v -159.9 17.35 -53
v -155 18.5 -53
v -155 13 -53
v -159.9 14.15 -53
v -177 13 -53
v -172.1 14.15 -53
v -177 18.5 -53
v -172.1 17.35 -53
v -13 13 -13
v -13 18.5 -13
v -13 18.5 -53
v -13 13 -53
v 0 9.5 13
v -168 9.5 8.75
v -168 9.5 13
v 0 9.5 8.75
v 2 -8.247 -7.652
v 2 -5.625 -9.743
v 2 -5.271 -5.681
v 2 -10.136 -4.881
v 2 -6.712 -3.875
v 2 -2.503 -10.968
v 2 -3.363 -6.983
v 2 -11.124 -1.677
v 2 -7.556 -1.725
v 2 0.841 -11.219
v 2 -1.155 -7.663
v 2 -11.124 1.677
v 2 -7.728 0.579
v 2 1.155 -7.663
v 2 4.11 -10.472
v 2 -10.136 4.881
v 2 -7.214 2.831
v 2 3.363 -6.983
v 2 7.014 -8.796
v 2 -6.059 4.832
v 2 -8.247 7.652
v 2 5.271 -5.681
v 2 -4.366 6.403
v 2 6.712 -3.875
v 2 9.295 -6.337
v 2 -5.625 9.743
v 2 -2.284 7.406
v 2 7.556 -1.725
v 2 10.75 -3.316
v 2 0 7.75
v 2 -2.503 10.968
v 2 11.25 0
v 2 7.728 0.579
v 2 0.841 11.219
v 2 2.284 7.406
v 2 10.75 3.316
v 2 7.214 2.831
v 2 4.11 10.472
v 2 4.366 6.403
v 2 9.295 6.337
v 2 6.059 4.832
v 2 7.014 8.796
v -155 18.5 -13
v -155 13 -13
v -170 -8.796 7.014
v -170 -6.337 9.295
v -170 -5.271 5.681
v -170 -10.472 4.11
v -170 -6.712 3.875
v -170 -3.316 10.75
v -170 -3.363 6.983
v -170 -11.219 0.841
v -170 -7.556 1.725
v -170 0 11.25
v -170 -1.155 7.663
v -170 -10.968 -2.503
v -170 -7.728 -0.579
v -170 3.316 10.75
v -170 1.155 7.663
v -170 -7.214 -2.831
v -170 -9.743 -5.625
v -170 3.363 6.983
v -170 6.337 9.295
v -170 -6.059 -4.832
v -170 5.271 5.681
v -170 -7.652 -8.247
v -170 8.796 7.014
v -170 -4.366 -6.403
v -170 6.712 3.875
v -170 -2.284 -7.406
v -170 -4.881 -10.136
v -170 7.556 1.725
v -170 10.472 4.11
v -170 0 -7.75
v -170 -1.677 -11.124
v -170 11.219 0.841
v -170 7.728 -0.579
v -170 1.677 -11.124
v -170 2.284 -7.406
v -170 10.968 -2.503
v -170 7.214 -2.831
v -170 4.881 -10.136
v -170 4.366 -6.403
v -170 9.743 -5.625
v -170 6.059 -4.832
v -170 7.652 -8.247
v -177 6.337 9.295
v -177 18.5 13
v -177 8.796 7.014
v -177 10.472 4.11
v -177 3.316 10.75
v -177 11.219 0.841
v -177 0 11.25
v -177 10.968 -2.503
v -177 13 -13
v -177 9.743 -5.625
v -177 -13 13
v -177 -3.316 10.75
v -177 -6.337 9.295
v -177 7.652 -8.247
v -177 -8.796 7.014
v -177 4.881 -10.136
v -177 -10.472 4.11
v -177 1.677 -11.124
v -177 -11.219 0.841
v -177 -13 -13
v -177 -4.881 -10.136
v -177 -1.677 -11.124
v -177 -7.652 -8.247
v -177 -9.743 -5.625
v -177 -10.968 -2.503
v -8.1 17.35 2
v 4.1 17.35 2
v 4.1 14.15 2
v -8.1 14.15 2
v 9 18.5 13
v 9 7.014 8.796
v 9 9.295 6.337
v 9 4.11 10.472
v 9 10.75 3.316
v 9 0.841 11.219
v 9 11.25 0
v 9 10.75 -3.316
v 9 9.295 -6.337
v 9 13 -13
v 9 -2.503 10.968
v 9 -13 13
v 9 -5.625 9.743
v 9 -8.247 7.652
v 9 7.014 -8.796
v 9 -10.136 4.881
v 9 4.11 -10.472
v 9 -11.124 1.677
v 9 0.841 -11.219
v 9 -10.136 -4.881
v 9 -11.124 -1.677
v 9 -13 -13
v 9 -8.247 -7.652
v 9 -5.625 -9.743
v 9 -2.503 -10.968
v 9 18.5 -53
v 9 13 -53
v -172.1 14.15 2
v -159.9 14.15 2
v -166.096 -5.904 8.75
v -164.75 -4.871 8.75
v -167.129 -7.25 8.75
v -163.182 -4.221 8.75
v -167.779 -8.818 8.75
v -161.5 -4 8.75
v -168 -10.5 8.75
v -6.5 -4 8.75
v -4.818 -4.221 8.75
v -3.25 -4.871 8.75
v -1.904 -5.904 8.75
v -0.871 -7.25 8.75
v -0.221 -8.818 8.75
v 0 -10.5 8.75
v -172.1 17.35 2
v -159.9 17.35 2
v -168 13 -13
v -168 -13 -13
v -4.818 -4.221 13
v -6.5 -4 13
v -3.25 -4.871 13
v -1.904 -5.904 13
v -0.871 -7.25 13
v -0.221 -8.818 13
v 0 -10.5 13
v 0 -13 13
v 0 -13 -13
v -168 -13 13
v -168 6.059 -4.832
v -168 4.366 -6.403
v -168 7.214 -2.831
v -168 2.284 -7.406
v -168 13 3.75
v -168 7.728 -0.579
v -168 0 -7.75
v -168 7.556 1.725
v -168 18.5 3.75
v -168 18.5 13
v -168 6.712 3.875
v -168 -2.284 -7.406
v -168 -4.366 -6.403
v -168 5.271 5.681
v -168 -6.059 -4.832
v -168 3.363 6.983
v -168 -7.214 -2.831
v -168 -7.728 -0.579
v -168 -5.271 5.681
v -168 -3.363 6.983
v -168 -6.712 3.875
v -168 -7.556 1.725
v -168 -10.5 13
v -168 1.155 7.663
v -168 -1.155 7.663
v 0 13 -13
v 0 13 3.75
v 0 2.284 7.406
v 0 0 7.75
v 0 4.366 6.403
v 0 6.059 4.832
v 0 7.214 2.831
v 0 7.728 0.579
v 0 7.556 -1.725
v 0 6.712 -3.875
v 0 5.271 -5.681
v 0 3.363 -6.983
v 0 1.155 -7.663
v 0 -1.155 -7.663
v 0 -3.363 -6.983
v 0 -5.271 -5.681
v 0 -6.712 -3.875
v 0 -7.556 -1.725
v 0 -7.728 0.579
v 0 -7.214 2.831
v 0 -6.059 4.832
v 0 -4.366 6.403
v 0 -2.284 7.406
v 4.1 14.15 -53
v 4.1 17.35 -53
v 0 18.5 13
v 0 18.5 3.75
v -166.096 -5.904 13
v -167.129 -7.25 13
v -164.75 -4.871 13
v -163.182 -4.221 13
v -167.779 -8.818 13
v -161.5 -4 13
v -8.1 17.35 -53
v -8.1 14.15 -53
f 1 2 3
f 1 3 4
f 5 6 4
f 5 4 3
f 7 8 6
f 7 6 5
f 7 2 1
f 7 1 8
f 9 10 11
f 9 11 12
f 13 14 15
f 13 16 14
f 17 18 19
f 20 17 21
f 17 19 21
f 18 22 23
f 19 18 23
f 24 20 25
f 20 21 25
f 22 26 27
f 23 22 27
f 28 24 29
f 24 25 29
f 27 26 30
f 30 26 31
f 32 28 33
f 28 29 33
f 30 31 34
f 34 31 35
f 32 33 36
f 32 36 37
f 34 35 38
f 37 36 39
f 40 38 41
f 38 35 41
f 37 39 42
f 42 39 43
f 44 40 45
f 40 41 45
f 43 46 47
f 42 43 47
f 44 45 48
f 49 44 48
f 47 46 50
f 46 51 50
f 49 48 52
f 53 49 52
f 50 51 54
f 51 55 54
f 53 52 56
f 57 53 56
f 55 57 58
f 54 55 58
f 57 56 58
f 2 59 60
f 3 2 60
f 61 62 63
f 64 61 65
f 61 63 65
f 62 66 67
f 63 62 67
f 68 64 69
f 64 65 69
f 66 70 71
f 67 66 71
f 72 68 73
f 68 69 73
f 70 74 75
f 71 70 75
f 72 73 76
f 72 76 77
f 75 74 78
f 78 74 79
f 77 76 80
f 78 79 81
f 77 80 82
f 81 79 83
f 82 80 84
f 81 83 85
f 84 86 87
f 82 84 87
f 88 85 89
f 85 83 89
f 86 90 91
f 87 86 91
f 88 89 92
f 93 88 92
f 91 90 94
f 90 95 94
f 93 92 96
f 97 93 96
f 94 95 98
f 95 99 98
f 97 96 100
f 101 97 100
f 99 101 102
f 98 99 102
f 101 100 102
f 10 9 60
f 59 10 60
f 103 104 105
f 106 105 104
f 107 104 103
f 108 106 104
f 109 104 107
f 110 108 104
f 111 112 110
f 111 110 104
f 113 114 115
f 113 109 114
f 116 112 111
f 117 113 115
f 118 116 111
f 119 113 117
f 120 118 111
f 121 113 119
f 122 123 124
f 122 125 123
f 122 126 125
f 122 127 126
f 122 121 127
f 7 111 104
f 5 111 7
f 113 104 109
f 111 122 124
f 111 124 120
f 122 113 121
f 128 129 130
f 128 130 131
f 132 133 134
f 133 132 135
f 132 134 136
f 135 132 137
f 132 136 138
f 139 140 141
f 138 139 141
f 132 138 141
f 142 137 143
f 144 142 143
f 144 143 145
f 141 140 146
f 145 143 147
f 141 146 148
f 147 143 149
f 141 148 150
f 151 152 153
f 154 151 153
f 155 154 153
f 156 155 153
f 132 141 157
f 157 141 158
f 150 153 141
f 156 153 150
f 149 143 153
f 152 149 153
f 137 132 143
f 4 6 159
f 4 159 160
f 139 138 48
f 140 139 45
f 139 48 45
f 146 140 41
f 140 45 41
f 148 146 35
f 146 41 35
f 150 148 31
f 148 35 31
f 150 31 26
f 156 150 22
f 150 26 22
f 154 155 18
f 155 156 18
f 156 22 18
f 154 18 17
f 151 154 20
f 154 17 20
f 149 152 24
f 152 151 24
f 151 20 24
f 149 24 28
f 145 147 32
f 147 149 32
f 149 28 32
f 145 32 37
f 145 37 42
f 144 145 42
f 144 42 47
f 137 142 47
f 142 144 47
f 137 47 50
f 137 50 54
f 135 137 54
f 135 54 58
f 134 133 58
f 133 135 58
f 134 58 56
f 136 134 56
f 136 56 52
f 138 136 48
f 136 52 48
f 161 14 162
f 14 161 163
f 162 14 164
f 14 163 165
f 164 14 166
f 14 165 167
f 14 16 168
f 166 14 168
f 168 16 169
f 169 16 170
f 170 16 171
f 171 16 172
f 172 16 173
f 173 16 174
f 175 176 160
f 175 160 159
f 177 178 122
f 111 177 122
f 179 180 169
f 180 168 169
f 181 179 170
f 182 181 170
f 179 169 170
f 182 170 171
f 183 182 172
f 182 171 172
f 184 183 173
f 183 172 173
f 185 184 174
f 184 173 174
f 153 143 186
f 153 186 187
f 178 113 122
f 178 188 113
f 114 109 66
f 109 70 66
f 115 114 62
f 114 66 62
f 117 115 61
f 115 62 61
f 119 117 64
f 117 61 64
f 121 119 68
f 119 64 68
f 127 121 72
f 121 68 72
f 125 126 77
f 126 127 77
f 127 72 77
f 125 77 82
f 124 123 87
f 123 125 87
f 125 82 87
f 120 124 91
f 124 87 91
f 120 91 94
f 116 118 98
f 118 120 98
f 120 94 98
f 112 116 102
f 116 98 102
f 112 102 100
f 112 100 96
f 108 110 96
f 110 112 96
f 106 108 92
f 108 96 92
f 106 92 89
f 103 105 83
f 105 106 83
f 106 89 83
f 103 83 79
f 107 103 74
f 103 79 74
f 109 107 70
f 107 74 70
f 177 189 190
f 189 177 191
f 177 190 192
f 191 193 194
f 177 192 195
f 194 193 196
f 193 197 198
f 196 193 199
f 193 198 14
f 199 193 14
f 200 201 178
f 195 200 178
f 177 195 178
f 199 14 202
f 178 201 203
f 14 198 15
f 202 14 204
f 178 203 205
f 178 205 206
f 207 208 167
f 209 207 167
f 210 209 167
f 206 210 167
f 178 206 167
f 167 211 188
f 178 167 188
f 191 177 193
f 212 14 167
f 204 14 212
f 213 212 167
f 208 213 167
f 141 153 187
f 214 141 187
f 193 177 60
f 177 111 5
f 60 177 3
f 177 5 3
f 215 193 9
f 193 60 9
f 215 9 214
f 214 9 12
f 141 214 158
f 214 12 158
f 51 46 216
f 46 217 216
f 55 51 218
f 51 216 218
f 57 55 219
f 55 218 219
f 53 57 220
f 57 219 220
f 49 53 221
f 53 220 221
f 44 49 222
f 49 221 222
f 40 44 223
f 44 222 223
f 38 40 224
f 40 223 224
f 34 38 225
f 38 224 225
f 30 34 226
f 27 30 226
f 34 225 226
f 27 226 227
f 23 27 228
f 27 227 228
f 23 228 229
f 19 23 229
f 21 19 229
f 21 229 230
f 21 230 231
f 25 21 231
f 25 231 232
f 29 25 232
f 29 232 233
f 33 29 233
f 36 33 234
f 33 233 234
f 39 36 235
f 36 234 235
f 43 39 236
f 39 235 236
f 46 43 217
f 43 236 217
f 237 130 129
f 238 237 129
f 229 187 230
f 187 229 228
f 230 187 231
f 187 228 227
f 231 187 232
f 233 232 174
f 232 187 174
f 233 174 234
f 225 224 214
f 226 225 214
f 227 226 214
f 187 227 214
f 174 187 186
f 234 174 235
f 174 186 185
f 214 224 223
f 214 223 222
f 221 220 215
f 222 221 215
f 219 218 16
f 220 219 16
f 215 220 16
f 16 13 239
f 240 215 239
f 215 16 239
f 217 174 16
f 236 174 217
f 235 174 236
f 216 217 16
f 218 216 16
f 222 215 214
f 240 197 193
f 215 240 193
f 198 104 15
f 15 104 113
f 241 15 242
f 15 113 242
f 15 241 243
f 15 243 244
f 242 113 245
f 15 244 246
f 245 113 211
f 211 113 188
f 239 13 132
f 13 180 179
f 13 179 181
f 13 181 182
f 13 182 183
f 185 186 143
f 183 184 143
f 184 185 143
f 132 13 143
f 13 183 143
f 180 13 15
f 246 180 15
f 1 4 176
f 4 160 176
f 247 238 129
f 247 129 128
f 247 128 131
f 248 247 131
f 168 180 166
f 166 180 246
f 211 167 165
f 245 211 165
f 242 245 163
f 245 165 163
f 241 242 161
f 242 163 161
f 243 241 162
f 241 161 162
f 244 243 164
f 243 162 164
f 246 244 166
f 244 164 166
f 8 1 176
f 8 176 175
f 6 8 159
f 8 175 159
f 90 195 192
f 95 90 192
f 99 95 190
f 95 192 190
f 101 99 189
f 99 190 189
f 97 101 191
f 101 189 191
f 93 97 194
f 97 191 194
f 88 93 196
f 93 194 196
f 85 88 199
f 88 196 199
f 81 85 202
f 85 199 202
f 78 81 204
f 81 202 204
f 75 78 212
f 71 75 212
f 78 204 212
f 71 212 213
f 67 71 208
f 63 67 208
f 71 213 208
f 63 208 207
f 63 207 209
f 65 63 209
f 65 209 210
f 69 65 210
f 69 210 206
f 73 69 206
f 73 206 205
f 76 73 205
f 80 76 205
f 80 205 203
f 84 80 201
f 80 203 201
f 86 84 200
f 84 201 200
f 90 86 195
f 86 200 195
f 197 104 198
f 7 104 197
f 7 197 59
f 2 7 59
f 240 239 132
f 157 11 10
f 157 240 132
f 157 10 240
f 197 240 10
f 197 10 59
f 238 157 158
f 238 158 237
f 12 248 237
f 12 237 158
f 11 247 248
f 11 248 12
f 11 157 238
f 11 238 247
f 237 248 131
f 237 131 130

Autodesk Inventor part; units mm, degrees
ref_plane "YZ Plane" through (0, 0, 0) normal (1, 0, 0) x (0, 1, 0)
ref_plane "XZ Plane" through (0, 0, 0) normal (0, 1, 0) x (-1, 0, 0)
ref_plane "XY Plane" through (0, 0, 0) normal (0, 0, 1) x (1, 0, 0)
sketch "Sketch1" plane through (0, 0, 0) normal (1, 0, 0) x (0, 1, 0)
  circle A0 centre (0, 0) radius 11.25
  line L0 (-11.25, 11.25) -> (11.25, 11.25) construction
  line L1 (11.25, 11.25) -> (11.25, -11.25) construction
  line L2 (11.25, -11.25) -> (-11.25, -11.25) construction
  line L3 (-11.25, -11.25) -> (-11.25, 11.25) construction
  line L4 (-11.25, 11.25) -> (11.25, -11.25) construction
  line L5 (11.25, 11.25) -> (-11.25, -11.25) construction
  line L6 (11.25, 11.25) -> (14.25, 11.25) construction
  line L7 (14.25, 11.25) -> (14.25, -11.25) construction
  line L8 (14.25, -11.25) -> (11.25, -11.25) construction
  line L9 (11.25, -11.25) -> (11.25, 11.25) construction
  line L10 (14.25, -11.25) -> (-11.25, -11.25) construction
  line L11 (-11.25, -11.25) -> (-11.25, -14.25) construction
  line L12 (-11.25, -14.25) -> (14.25, -14.25) construction
  line L13 (14.25, -14.25) -> (14.25, -11.25) construction
  line L14 (-13, 13) -> (13, 13)
  line L15 (13, 13) -> (13, -13)
  line L16 (13, -13) -> (-13, -13)
  line L17 (-13, -13) -> (-13, 13)
  line L18 (-13, 13) -> (13, -13) construction
  line L19 (13, 13) -> (-13, -13) construction
  dimension "d0" = 22.5
  dimension "d1" = 3
  dimension "d2" = 3
  dimension "d3" = 26
  dimension "d4" = 26
extrude "Extrusion1" add sketch "Sketch1" along normal blind 9
sketch "Sketch2" plane through (0, 0, 0) normal (-1, 0, 0) x (0, 0, 1)
  circle A0 centre (0, 0) radius 7.75
  circle A1 centre (0, 0) radius 11.25
  dimension "d7" = 15.5
extrude "Extrusion2" add sketch "Sketch2" against normal blind 2
sketch "Sketch3" plane through (0, 0, 0) normal (-1, 0, 0) x (0, 0, 1)
  line L0 (13, 13) -> (-13, 13) projected
  line L1 (13, 13) -> (8.75, 13)
  line L2 (8.75, 13) -> (8.75, -13)
  line L3 (8.75, -13) -> (13, -13)
  line L4 (13, -13) -> (13, 13)
  point P0 (0, 0)
  dimension "d10" = 4.25
  dimension "d11" = 26
extrude "Extrusion3" add sketch "Sketch3" along normal blind 168
sketch "Sketch4" plane through (-168, 0, 0) normal (-1, 0, 0) x (0, 0, 1)
  line L0 (13, 13) -> (13, -13) projected
  line L1 (-13, -13) -> (-13, 13) projected
  line L2 (13, -13) -> (-13, -13)
  line L3 (-13, -13) -> (-13, 13)
  line L4 (-13, 13) -> (13, 13)
  line L5 (13, 13) -> (13, -13)
  circle A0 centre (0, 0) radius 7.75
  circle A1 centre (0, 0) radius 11.25
extrude "Extrusion4" add sketch "Sketch4" along normal blind 9 contours L0 L2 L1 L4
sketch "Sketch5" plane through (-168, 0, 0) normal (1, 0, 0) x (0, 0, -1)
  circle A0 centre (0, 0) radius 7.75
  circle A1 centre (0, 0) radius 11.25
extrude "Extrusion5" add sketch "Sketch5" against normal blind 2
sketch "Sketch6" plane through (0, 13, -13) normal (0, 1, 0) x (1, 0, 0)
  line L0 (9, -26) -> (9, 0) projected
  line L1 (-177, -26) -> (-177, 0) projected
  line L2 (9, 0) -> (-177, 0)
  line L3 (-177, 0) -> (-177, -26)
  line L4 (-177, -26) -> (9, -26)
  line L5 (9, -26) -> (9, 0)
  point P0 (0, -13)
extrude "Extrusion6" add sketch "Sketch6" along normal blind 5.5
ref_plane "Work Plane1" through (0, 0, 0) normal (-1, 0, 0) x (0, 0, 1)
sketch "Sketch7" plane through (0, 0, 0) normal (-1, 0, 0) x (0, 0, 1)
  line L0 (13, -13) -> (13, 18.5) projected
  line L1 (13, 18.5) -> (3.75, 18.5)
  line L2 (3.75, 18.5) -> (3.75, 9.5)
  line L3 (3.75, 9.5) -> (13, 9.5)
  line L4 (13, 9.5) -> (13, 18.5)
  point P0 (0, 0)
  dimension "d21" = 9.25
  dimension "d22" = 9
extrude "Extrusion7" cut sketch "Sketch7" along normal blind 168
sketch "Sketch8" plane through (0, 0, 0) normal (-1, 0, 0) x (0, 0, 1)
  point P0 (0, 0)
sketch "Sketch9" plane through (-177, -13, 13) normal (0, 0, 1) x (1, 0, 0)
  point P0 (177, 13)
sketch "Sketch10" plane through (-177, -13, 13) normal (0, 0, 1) x (1, 0, 0)
  line L0 (0, 0) -> (0, 31.5) construction
  line L1 (9, 0) -> (0, 0) construction
  line L2 (0, 31.5) -> (9, 31.5) construction
  line L3 (9, 31.5) -> (9, 0) construction
  line L4 (9, 0) -> (0, 0) construction
  line L5 (0, 0) -> (0, 31.5) construction
  line L6 (186, 31.5) -> (0, 31.5) construction
  line L7 (0, 0) -> (186, 0) construction
  line L8 (186, 31.5) -> (177, 31.5) construction
  line L9 (177, 31.5) -> (177, 0) construction
  line L10 (177, 0) -> (186, 0) construction
  line L11 (186, 0) -> (186, 31.5) construction
  line L12 (9, 22.5) -> (9, 0) projected
  line L13 (177, 0) -> (177, 22.5) projected
  line L14 (9, 0) -> (177, 0)
  line L15 (177, 0) -> (177, 9)
  line L16 (177, 9) -> (9, 9)
  line L17 (9, 9) -> (9, 0)
  point P0 (177, 13)
  dimension "d25" = 9
extrude "Extrusion8" cut sketch "Sketch10" against normal blind 5
fillet "Fillet1" radius 6.5 2 edges at (0, -4, 10.875) (-168, -4, 10.875)
sketch "Sketch11" plane through (9, -13, -13) normal (0, 0, -1) x (-1, 0, 0)
  point P0 (9, 13)
sketch "Sketch12" plane through (9, -13, -13) normal (0, 0, -1) x (-1, 0, 0)
  line L0 (0, 31.5) -> (186, 31.5) construction
  line L1 (9, 26) -> (177, 26) construction
  line L2 (0, 31.5) -> (22, 31.5) construction
  line L3 (22, 31.5) -> (22, 26) construction
  line L4 (22, 26) -> (0, 26) construction
  line L5 (0, 26) -> (0, 31.5) construction
  line L6 (17.1, 27.15) -> (4.9, 27.15) construction
  line L7 (4.9, 27.15) -> (4.9, 30.35) construction
  line L8 (4.9, 30.35) -> (17.1, 30.35) construction
  line L9 (17.1, 30.35) -> (17.1, 27.15) construction
  line L10 (17.1, 27.15) -> (4.9, 30.35) construction
  line L11 (4.9, 27.15) -> (17.1, 30.35) construction
  line L12 (17.1, 27.15) -> (4.9, 27.15)
  line L13 (4.9, 27.15) -> (4.9, 30.35)
  line L14 (4.9, 30.35) -> (17.1, 30.35)
  line L15 (17.1, 30.35) -> (17.1, 27.15)
  line L16 (17.1, 27.15) -> (4.9, 30.35) construction
  line L17 (4.9, 27.15) -> (17.1, 30.35) construction
  line L18 (186, 0) -> (186, 31.5) construction
  line L19 (186, 31.5) -> (164, 31.5) construction
  line L20 (164, 31.5) -> (164, 26) construction
  line L21 (164, 26) -> (186, 26) construction
  line L22 (186, 26) -> (186, 31.5) construction
  line L23 (181.1, 27.15) -> (168.9, 27.15)
  line L24 (168.9, 27.15) -> (168.9, 30.35)
  line L25 (168.9, 30.35) -> (181.1, 30.35)
  line L26 (181.1, 30.35) -> (181.1, 27.15)
  line L27 (181.1, 27.15) -> (168.9, 30.35) construction
  line L28 (168.9, 27.15) -> (181.1, 30.35) construction
  line L29 (22, 26) -> (0, 26)
  line L30 (0, 26) -> (0, 31.5)
  line L31 (0, 31.5) -> (22, 31.5)
  line L32 (22, 31.5) -> (22, 26)
  line L33 (164, 26) -> (186, 26)
  line L34 (186, 26) -> (186, 31.5)
  line L35 (186, 31.5) -> (164, 31.5)
  line L36 (164, 31.5) -> (164, 26)
  point P0 (9, 13)
  point P1 (11, 28.75)
  point P2 (175, 28.75)
  dimension "d29" = 22
  dimension "d30" = 12.2
  dimension "d31" = 3.2
  dimension "d32" = 22
  dimension "d33" = 12.2
  dimension "d34" = 3.2
extrude "Extrusion9" add sketch "Sketch12" along normal blind 40
sketch "Sketch13" plane through (4.1, 17.35, -13) normal (0, 0, -1) x (-1, 0, 0)
  line L0 (0, 0) -> (12.2, 0) projected
  line L1 (0, -3.2) -> (12.2, -3.2) projected
  line L2 (0, 0) -> (12.2, 0)
  line L3 (12.2, 0) -> (12.2, -3.2)
  line L4 (12.2, -3.2) -> (0, -3.2)
  line L5 (0, -3.2) -> (0, 0)
  line L6 (176.2, 0) -> (164, 0) projected
  line L7 (164, -3.2) -> (176.2, -3.2) projected
  line L8 (164, 0) -> (176.2, 0)
  line L9 (176.2, 0) -> (176.2, -3.2)
  line L10 (176.2, -3.2) -> (164, -3.2)
  line L11 (164, -3.2) -> (164, 0)
  point P0 (4.1, -17.35)
extrude "Extrusion10" cut sketch "Sketch13" against normal blind 15
sketch "Sketch14" plane through (-177, 0, 0) normal (-1, 0, 0) x (0, 0, 1)
  line L0 (14, -14) -> (-14, -14) construction
  line L1 (-14, -14) -> (-14, 14) construction
  line L2 (-14, 14) -> (14, 14) construction
  line L3 (14, 14) -> (14, -14) construction
  line L4 (14, -14) -> (-14, 14) construction
  line L5 (-14, -14) -> (14, 14) construction
  point P0 (0, 0)
  dimension "d39" = 28
  dimension "d40" = 28
sketch "Sketch15" plane through (0, 0, 0) normal (-1, 0, 0) x (0, 0, 1)
  line L0 (-33, -19) -> (-14, -19) construction
  line L1 (-14, -19) -> (-14, 0) construction
  line L2 (-33, 19) -> (-14, 19) construction
  line L3 (-14, -19) -> (-52, -19) construction
  line L4 (-52, -19) -> (-52, 19) construction
  line L5 (-52, 19) -> (-14, 19) construction
  point P0 (0, 0)
  dimension "d41" = 19
  dimension "d45" = 38
properties part number "rearAxelHolder 9-19"
